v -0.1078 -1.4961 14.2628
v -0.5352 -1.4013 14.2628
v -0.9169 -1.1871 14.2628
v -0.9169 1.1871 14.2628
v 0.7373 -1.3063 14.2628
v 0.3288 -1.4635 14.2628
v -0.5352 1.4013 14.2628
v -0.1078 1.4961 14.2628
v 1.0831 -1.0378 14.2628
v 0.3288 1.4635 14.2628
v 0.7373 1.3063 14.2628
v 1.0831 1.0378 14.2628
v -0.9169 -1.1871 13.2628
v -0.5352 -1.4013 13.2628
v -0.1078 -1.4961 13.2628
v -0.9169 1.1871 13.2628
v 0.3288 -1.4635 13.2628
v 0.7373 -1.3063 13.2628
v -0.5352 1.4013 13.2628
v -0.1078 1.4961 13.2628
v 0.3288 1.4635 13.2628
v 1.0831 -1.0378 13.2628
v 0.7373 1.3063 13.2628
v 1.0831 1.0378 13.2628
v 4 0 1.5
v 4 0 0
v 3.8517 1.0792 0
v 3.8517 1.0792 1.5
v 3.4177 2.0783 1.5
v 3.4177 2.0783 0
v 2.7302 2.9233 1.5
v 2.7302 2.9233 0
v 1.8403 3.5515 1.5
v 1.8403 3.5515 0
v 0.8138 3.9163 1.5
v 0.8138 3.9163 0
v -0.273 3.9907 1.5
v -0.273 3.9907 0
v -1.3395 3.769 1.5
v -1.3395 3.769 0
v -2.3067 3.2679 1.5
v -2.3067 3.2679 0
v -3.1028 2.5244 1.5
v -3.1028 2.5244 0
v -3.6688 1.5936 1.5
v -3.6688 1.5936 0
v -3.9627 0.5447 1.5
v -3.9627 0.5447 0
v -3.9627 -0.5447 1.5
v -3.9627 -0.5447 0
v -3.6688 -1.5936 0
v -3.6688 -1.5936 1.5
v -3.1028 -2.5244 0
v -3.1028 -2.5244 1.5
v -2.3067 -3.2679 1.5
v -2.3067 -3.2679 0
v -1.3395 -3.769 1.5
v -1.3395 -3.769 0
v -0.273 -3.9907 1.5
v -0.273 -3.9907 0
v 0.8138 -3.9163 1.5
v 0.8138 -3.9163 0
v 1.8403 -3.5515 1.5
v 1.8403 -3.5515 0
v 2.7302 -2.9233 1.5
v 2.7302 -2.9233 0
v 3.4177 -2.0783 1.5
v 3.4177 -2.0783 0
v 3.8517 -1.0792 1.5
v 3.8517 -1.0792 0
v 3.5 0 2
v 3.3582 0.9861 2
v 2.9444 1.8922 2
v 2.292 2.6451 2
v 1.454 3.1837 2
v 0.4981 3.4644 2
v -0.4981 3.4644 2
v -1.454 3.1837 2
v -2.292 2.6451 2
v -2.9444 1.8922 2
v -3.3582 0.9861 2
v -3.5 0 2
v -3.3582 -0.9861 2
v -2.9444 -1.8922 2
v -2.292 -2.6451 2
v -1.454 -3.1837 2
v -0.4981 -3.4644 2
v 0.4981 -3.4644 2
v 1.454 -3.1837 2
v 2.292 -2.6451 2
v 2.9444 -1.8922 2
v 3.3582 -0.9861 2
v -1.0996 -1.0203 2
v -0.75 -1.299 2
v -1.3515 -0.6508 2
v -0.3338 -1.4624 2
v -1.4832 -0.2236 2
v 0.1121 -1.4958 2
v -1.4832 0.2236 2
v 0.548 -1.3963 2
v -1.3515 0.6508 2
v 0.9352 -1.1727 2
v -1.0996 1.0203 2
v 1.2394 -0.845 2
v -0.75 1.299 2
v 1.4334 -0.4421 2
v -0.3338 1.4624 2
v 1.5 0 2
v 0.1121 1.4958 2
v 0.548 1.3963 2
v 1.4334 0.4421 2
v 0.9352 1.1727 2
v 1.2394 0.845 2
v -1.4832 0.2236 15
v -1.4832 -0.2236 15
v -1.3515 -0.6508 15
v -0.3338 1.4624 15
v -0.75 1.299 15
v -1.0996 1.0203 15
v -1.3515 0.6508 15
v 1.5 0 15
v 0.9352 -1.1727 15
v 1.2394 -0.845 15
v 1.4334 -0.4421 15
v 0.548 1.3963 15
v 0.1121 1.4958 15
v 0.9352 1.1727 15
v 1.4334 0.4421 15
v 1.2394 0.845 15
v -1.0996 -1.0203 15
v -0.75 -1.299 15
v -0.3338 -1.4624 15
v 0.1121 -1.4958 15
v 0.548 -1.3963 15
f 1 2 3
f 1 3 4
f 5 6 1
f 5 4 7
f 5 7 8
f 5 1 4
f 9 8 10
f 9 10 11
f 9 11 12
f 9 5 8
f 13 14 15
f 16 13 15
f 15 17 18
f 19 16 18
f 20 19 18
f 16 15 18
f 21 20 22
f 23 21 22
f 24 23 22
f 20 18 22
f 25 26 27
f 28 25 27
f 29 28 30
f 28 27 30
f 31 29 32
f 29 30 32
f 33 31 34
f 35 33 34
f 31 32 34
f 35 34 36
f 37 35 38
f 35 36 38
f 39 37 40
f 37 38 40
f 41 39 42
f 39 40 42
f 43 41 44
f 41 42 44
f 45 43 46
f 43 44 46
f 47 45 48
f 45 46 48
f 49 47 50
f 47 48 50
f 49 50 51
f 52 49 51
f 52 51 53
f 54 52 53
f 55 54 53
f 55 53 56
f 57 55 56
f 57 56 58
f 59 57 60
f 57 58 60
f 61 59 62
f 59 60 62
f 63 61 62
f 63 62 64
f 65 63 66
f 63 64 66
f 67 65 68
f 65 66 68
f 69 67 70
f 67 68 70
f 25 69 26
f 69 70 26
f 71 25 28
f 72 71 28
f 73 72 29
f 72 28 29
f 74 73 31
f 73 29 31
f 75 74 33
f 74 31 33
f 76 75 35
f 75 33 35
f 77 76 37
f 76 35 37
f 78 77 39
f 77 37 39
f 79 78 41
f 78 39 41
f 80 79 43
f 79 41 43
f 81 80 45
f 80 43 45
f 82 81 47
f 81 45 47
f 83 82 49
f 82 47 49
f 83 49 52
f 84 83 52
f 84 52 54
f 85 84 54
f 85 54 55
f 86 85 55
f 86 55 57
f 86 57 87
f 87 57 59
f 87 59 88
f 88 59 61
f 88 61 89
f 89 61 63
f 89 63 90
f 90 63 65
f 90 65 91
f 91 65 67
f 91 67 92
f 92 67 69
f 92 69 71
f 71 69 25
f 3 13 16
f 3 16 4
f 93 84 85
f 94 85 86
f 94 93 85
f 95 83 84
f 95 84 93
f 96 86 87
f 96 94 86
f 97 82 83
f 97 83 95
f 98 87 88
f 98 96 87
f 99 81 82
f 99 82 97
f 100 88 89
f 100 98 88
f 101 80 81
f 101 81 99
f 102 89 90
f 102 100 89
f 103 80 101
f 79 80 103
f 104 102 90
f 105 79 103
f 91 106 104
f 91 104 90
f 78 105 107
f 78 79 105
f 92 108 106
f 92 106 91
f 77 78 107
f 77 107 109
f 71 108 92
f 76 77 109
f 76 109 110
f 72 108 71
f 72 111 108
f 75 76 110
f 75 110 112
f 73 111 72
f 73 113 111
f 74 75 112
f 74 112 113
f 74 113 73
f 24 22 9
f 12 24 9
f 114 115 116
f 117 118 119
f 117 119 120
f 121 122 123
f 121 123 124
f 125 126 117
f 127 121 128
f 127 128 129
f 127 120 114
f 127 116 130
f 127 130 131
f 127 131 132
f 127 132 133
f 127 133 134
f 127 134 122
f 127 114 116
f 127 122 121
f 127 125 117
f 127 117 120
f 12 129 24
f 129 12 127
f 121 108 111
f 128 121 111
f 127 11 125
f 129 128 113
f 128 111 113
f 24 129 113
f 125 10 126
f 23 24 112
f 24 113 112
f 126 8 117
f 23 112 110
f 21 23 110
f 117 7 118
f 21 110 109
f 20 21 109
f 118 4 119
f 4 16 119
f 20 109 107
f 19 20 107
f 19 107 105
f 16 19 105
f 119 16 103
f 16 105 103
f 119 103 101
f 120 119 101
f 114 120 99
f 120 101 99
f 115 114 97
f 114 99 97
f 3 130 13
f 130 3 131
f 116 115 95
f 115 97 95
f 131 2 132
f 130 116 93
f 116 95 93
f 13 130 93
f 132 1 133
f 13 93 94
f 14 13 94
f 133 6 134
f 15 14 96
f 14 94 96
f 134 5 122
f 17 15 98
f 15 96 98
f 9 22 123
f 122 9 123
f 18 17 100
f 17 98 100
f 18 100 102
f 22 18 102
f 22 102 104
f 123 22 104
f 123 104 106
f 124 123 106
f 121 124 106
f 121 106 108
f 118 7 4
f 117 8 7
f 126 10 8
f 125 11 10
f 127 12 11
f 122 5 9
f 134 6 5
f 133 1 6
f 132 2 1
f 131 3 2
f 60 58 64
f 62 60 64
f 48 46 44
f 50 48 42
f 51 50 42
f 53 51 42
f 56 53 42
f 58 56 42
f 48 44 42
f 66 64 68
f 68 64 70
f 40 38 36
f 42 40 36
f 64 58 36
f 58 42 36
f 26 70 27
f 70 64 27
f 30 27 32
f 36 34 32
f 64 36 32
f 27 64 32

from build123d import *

# Parameters (mm, degrees)
F0_R     = 4
F0_R_2   = 1.5
F1_DEPTH = 2
F2_DEPTH = 15
F3_SIZE  = 0.5
F4_W     = 2
F4_H     = 1
F5_DEPTH = 4.001
F6_DEPTH = 25.4


with BuildPart() as f1:
    # F0 (on Top) → F1 (new body)
    with BuildSketch(Plane.XY):
        Circle(F0_R)
        Circle(F0_R_2, mode=Mode.SUBTRACT)
    extrude(amount=F1_DEPTH)

    # F0 (on Top) → F2 (join)
    with BuildSketch(Plane.XY):
        Circle(F0_R_2)
    extrude(amount=F2_DEPTH)

    # F3
    f3_edges = [f1.edges().sort_by_distance(p)[0] for p in [
        (-4, 0, 2),
    ]]
    chamfer(f3_edges, length=F3_SIZE)

    # F4 (on Front) → F5 (cut, through all)
    with BuildSketch(Plane.XZ):
        with Locations((0.083052, 13.76275)):
            Rectangle(F4_W, F4_H)
    extrude(amount=-F5_DEPTH, mode=Mode.SUBTRACT)

    # F4 (on Front) → F6 (cut)
    with BuildSketch(Plane.XZ):
        with Locations((0.083052, 13.76275)):
            Rectangle(F4_W, F4_H)
    extrude(amount=F6_DEPTH, mode=Mode.SUBTRACT)


solid = f1.part
